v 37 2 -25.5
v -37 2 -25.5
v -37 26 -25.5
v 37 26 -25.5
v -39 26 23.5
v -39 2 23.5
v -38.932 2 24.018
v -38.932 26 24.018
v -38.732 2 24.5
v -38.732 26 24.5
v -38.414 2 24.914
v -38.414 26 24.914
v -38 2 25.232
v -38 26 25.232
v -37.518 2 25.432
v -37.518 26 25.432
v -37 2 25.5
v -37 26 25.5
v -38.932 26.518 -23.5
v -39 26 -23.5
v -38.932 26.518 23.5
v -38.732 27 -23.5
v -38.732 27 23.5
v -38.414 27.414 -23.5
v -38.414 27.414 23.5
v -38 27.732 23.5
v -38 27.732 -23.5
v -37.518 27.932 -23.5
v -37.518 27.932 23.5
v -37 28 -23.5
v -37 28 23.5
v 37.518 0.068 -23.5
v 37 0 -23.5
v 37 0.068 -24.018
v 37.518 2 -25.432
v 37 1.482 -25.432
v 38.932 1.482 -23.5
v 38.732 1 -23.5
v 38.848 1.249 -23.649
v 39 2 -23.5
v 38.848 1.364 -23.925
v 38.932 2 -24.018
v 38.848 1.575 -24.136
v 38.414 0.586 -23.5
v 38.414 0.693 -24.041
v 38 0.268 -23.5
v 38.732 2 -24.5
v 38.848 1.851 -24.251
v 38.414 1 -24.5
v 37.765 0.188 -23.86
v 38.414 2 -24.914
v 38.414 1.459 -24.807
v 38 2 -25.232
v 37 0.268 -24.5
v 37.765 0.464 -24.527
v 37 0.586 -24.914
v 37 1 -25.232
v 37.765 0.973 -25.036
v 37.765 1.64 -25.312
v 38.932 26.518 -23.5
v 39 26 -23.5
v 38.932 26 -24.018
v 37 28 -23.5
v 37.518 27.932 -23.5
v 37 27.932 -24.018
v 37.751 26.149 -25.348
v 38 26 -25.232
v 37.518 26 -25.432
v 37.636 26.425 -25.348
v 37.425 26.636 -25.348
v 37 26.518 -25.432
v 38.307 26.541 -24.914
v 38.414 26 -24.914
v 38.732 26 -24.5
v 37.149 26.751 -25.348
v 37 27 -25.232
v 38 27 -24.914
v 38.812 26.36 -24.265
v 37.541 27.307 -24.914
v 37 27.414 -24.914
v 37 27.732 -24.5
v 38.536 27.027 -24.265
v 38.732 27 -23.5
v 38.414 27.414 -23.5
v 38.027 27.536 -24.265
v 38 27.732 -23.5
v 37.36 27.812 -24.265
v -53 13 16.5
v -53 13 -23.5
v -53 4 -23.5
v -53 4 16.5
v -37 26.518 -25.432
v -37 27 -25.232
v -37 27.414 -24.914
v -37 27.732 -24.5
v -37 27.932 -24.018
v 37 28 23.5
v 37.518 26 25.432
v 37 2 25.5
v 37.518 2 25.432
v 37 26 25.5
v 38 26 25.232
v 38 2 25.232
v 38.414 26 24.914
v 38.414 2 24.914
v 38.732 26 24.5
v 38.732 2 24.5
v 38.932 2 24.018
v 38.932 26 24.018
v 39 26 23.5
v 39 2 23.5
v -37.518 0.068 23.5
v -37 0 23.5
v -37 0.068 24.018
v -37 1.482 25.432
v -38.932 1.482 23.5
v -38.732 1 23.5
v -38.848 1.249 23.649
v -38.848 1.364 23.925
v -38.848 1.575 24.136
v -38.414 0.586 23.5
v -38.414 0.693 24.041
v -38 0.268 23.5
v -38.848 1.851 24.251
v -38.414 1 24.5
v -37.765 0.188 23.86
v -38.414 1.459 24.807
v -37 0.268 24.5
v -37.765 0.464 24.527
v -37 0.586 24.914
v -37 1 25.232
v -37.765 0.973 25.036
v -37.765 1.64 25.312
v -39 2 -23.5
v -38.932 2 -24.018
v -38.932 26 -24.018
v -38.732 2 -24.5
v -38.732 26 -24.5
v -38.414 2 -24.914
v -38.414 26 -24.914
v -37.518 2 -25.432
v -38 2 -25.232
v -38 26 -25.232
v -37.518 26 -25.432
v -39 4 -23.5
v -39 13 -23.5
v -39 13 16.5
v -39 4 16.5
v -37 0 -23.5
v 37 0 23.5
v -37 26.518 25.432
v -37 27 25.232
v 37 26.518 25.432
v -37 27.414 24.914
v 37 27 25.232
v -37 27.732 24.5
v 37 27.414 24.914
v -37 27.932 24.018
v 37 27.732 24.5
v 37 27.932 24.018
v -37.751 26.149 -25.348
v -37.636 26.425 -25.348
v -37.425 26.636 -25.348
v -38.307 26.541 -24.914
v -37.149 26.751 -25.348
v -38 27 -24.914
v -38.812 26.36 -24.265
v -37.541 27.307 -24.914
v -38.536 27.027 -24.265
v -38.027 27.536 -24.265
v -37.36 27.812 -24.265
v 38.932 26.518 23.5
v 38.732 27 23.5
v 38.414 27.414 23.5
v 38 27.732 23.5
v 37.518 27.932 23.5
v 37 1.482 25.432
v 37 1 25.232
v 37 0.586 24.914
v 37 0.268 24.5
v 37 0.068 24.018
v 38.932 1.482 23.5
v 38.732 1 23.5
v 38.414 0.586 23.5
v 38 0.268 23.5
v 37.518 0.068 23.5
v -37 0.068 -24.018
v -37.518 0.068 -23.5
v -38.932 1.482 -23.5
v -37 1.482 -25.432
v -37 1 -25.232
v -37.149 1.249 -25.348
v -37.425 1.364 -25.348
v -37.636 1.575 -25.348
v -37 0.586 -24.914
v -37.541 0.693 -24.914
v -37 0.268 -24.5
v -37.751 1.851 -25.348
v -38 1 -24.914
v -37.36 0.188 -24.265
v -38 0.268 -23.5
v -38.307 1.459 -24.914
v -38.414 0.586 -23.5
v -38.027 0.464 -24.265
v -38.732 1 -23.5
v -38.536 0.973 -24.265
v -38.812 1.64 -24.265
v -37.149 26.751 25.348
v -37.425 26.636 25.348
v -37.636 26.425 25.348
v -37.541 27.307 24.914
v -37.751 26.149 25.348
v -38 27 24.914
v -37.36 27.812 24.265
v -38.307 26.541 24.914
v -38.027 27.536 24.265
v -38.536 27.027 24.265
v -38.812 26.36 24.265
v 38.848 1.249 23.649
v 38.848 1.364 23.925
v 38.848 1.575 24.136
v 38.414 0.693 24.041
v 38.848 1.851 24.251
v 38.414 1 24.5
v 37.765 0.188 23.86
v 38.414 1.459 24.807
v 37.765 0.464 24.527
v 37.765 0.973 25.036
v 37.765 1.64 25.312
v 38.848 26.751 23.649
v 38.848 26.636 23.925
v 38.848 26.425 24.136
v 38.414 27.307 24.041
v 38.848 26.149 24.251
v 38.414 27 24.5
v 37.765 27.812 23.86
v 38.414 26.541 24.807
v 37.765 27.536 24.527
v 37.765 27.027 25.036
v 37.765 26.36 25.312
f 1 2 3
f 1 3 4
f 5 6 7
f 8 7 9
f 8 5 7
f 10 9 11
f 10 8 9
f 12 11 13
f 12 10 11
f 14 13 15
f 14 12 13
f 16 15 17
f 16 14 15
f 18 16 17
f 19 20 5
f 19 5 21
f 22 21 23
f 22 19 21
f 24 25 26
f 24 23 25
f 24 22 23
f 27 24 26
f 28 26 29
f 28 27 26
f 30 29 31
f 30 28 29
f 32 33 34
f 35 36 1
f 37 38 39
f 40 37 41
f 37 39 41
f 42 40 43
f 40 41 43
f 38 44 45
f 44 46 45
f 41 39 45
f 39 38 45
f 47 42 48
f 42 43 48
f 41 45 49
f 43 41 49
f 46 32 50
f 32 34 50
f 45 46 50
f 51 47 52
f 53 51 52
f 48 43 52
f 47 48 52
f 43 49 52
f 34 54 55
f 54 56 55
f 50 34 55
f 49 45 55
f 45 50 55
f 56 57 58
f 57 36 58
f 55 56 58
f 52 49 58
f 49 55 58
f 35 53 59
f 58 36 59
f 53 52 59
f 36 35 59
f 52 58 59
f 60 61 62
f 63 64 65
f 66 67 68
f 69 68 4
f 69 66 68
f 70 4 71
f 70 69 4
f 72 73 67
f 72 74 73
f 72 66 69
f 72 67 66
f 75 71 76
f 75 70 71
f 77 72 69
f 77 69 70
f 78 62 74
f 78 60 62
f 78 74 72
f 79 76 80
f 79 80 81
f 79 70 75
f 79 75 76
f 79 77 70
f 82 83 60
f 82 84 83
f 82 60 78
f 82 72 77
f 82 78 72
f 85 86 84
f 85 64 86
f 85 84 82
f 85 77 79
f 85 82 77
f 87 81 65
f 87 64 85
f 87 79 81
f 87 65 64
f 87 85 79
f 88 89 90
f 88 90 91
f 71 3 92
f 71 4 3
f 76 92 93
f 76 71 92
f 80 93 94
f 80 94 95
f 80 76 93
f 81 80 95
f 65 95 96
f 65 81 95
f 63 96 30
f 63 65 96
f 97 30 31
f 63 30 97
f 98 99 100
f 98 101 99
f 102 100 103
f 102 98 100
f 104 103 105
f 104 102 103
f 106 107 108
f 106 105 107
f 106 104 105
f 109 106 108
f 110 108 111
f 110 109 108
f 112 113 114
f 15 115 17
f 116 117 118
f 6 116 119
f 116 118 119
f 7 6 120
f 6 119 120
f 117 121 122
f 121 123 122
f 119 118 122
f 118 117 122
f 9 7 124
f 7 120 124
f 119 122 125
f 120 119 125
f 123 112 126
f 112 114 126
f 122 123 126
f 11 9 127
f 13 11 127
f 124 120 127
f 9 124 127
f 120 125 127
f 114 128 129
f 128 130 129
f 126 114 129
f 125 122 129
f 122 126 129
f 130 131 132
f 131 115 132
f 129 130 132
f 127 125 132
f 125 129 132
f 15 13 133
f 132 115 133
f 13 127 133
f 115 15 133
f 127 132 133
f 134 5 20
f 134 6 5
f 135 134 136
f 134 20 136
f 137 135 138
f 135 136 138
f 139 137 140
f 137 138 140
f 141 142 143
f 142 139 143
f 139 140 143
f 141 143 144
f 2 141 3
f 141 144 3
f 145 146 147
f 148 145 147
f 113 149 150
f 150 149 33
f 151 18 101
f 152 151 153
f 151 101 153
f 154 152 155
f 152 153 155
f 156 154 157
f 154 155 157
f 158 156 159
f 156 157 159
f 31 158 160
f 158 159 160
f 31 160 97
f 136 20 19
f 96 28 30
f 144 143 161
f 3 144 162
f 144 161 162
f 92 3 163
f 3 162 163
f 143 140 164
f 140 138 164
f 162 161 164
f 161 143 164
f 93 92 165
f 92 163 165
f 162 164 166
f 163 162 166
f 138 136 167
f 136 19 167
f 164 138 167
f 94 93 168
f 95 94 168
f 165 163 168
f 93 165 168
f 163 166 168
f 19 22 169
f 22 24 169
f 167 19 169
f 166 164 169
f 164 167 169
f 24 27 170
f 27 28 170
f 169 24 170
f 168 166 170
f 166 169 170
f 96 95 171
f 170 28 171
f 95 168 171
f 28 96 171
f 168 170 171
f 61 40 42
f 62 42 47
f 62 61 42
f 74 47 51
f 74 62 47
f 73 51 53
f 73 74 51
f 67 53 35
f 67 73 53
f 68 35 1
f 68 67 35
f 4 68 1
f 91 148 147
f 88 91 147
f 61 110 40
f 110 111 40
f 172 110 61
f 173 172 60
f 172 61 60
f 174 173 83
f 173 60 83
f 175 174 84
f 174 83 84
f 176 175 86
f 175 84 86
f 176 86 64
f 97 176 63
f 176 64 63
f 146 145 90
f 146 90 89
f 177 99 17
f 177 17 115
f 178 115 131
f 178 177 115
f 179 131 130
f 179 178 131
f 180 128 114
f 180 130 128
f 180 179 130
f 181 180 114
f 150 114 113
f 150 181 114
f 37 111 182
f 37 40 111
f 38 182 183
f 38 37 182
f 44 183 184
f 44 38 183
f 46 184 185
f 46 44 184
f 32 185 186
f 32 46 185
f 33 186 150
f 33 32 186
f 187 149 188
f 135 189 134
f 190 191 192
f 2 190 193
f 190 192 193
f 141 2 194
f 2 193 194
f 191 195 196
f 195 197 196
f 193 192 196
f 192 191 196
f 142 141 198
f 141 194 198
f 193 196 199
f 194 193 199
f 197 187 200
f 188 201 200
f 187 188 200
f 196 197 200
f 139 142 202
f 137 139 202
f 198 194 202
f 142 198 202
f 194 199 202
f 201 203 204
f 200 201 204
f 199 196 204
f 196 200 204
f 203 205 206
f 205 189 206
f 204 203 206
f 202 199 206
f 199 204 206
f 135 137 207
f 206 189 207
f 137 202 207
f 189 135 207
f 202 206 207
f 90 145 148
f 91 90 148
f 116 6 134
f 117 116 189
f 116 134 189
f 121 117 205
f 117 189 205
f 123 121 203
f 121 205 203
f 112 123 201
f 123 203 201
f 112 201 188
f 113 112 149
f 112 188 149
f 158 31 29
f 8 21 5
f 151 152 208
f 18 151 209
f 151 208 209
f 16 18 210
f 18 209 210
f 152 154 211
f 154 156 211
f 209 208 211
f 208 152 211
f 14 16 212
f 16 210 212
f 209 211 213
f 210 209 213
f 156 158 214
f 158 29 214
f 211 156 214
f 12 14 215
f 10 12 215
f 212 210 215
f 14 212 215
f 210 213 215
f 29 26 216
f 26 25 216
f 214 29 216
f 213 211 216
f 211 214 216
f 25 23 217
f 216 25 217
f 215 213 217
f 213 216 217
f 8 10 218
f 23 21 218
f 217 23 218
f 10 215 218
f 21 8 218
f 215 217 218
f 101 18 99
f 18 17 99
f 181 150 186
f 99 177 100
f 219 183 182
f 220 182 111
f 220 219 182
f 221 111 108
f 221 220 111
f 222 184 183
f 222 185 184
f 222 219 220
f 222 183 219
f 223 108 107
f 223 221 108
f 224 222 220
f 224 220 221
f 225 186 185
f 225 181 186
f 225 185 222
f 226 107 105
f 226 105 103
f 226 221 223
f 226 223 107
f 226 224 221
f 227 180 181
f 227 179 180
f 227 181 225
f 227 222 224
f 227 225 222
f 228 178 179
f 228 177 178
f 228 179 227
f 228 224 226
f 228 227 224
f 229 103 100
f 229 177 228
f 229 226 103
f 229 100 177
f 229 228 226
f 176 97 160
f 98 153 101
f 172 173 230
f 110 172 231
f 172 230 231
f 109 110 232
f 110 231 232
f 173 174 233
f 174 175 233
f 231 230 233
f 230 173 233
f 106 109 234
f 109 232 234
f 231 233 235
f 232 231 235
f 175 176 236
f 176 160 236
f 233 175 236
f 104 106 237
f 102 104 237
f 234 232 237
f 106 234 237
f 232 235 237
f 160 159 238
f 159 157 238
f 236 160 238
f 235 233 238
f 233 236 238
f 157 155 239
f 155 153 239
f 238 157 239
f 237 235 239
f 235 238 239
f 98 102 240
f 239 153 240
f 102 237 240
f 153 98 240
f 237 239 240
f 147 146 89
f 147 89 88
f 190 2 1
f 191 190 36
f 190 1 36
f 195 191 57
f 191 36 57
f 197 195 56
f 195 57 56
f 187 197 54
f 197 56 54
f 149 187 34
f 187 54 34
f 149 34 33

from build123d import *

# Parameters (mm, degrees)
SKETCH2_W           = 78
SKETCH2_H           = 51
BOSS_EXTRUDE1_DEPTH = 28
SKETCH3_W           = 40
SKETCH3_H           = 9
BOSS_EXTRUDE2_DEPTH = 14
FILLET1_R           = 2


with BuildPart() as part:
    # Sketch2 → Boss-Extrude1 (new body)
    with BuildSketch(Plane(origin=(0, 0, 0), x_dir=(1, 0, 0), z_dir=(0, 1, 0))):
        Rectangle(SKETCH2_W, SKETCH2_H)
    extrude(amount=BOSS_EXTRUDE1_DEPTH)

    # Fillet1
    fillet1_edges = [part.edges().sort_by_distance(p)[0] for p in [
        (-39, 28, 0),
        (0, 28, 25.5),
        (39, 28, 0),
        (0, 0, 25.5),
        (-39, 0, 0),
        (0, 0, -25.5),
        (39, 0, 0),
        (39, 14, 25.5),
        (-39, 14, 25.5),
        (-39, 14, -25.5),
        (39, 14, -25.5),
        (0, 28, -25.5),
    ]]
    fillet(fillet1_edges, radius=FILLET1_R)


with BuildPart() as body_2:
    # Sketch3 → Boss-Extrude2 (new body)
    with BuildSketch(Plane.ZY.offset(39)):
        with Locations((-3.5, 8.5)):
            Rectangle(SKETCH3_W, SKETCH3_H)
    extrude(amount=BOSS_EXTRUDE2_DEPTH)


solid = Compound([part.part, body_2.part])
